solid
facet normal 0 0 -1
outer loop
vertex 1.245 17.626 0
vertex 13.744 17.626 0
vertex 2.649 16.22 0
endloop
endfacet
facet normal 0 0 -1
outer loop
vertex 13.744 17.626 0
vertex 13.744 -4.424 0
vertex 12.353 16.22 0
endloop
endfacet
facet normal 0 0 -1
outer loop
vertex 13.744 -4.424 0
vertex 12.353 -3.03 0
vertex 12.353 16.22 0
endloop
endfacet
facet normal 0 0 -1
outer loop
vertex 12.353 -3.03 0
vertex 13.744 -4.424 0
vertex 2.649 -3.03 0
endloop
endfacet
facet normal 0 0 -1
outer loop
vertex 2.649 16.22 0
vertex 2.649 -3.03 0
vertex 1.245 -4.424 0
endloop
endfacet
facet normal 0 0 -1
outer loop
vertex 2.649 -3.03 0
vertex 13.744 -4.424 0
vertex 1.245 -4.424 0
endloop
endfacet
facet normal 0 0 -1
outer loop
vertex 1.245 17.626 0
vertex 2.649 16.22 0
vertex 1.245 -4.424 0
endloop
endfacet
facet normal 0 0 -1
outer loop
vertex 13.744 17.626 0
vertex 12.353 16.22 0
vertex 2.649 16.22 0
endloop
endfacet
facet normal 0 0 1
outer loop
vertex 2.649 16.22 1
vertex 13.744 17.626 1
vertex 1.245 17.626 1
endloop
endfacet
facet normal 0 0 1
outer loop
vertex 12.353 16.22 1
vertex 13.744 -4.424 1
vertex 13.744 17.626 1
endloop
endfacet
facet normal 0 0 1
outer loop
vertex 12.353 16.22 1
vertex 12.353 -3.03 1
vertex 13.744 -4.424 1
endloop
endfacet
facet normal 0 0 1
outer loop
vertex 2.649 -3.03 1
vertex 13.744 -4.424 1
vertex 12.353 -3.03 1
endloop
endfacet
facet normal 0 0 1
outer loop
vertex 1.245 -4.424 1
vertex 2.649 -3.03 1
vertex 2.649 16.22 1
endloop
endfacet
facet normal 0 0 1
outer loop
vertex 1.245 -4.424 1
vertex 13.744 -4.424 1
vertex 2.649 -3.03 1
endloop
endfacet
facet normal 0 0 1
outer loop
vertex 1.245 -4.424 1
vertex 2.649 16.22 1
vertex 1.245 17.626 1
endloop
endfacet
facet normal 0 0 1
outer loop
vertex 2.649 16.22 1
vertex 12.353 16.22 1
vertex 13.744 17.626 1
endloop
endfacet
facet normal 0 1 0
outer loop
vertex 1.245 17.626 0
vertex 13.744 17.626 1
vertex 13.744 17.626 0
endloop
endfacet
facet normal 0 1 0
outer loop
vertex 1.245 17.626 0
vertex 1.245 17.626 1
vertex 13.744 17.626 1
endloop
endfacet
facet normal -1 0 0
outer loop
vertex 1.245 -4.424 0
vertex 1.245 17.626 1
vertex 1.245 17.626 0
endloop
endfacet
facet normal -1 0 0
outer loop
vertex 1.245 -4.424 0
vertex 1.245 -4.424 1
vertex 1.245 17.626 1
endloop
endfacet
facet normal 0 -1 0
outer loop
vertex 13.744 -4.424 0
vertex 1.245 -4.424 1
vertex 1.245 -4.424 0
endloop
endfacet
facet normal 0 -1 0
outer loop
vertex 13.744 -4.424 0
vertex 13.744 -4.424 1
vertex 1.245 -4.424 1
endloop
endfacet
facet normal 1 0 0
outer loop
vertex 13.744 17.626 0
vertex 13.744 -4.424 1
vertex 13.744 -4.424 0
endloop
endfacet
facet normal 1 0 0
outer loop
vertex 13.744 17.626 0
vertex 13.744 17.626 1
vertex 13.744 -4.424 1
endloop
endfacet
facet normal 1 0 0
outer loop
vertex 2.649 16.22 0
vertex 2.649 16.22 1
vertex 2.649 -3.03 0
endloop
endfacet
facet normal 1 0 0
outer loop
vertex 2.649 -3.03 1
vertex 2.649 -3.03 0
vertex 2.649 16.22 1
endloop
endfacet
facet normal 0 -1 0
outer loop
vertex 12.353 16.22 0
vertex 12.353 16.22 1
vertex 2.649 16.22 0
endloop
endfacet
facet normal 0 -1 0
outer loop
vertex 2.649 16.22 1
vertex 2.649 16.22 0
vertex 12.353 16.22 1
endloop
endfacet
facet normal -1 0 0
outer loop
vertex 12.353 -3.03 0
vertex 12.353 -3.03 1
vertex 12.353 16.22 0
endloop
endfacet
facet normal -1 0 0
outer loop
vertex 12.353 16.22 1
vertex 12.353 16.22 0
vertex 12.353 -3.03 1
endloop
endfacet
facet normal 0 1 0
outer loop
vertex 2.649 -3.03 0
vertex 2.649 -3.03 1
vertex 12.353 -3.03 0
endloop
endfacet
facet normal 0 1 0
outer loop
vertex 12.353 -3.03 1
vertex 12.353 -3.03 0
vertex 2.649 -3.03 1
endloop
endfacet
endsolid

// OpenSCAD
linear_extrude(1)
text("\uf1d1", font = "Iosevka Nerd Font", size = 18);
